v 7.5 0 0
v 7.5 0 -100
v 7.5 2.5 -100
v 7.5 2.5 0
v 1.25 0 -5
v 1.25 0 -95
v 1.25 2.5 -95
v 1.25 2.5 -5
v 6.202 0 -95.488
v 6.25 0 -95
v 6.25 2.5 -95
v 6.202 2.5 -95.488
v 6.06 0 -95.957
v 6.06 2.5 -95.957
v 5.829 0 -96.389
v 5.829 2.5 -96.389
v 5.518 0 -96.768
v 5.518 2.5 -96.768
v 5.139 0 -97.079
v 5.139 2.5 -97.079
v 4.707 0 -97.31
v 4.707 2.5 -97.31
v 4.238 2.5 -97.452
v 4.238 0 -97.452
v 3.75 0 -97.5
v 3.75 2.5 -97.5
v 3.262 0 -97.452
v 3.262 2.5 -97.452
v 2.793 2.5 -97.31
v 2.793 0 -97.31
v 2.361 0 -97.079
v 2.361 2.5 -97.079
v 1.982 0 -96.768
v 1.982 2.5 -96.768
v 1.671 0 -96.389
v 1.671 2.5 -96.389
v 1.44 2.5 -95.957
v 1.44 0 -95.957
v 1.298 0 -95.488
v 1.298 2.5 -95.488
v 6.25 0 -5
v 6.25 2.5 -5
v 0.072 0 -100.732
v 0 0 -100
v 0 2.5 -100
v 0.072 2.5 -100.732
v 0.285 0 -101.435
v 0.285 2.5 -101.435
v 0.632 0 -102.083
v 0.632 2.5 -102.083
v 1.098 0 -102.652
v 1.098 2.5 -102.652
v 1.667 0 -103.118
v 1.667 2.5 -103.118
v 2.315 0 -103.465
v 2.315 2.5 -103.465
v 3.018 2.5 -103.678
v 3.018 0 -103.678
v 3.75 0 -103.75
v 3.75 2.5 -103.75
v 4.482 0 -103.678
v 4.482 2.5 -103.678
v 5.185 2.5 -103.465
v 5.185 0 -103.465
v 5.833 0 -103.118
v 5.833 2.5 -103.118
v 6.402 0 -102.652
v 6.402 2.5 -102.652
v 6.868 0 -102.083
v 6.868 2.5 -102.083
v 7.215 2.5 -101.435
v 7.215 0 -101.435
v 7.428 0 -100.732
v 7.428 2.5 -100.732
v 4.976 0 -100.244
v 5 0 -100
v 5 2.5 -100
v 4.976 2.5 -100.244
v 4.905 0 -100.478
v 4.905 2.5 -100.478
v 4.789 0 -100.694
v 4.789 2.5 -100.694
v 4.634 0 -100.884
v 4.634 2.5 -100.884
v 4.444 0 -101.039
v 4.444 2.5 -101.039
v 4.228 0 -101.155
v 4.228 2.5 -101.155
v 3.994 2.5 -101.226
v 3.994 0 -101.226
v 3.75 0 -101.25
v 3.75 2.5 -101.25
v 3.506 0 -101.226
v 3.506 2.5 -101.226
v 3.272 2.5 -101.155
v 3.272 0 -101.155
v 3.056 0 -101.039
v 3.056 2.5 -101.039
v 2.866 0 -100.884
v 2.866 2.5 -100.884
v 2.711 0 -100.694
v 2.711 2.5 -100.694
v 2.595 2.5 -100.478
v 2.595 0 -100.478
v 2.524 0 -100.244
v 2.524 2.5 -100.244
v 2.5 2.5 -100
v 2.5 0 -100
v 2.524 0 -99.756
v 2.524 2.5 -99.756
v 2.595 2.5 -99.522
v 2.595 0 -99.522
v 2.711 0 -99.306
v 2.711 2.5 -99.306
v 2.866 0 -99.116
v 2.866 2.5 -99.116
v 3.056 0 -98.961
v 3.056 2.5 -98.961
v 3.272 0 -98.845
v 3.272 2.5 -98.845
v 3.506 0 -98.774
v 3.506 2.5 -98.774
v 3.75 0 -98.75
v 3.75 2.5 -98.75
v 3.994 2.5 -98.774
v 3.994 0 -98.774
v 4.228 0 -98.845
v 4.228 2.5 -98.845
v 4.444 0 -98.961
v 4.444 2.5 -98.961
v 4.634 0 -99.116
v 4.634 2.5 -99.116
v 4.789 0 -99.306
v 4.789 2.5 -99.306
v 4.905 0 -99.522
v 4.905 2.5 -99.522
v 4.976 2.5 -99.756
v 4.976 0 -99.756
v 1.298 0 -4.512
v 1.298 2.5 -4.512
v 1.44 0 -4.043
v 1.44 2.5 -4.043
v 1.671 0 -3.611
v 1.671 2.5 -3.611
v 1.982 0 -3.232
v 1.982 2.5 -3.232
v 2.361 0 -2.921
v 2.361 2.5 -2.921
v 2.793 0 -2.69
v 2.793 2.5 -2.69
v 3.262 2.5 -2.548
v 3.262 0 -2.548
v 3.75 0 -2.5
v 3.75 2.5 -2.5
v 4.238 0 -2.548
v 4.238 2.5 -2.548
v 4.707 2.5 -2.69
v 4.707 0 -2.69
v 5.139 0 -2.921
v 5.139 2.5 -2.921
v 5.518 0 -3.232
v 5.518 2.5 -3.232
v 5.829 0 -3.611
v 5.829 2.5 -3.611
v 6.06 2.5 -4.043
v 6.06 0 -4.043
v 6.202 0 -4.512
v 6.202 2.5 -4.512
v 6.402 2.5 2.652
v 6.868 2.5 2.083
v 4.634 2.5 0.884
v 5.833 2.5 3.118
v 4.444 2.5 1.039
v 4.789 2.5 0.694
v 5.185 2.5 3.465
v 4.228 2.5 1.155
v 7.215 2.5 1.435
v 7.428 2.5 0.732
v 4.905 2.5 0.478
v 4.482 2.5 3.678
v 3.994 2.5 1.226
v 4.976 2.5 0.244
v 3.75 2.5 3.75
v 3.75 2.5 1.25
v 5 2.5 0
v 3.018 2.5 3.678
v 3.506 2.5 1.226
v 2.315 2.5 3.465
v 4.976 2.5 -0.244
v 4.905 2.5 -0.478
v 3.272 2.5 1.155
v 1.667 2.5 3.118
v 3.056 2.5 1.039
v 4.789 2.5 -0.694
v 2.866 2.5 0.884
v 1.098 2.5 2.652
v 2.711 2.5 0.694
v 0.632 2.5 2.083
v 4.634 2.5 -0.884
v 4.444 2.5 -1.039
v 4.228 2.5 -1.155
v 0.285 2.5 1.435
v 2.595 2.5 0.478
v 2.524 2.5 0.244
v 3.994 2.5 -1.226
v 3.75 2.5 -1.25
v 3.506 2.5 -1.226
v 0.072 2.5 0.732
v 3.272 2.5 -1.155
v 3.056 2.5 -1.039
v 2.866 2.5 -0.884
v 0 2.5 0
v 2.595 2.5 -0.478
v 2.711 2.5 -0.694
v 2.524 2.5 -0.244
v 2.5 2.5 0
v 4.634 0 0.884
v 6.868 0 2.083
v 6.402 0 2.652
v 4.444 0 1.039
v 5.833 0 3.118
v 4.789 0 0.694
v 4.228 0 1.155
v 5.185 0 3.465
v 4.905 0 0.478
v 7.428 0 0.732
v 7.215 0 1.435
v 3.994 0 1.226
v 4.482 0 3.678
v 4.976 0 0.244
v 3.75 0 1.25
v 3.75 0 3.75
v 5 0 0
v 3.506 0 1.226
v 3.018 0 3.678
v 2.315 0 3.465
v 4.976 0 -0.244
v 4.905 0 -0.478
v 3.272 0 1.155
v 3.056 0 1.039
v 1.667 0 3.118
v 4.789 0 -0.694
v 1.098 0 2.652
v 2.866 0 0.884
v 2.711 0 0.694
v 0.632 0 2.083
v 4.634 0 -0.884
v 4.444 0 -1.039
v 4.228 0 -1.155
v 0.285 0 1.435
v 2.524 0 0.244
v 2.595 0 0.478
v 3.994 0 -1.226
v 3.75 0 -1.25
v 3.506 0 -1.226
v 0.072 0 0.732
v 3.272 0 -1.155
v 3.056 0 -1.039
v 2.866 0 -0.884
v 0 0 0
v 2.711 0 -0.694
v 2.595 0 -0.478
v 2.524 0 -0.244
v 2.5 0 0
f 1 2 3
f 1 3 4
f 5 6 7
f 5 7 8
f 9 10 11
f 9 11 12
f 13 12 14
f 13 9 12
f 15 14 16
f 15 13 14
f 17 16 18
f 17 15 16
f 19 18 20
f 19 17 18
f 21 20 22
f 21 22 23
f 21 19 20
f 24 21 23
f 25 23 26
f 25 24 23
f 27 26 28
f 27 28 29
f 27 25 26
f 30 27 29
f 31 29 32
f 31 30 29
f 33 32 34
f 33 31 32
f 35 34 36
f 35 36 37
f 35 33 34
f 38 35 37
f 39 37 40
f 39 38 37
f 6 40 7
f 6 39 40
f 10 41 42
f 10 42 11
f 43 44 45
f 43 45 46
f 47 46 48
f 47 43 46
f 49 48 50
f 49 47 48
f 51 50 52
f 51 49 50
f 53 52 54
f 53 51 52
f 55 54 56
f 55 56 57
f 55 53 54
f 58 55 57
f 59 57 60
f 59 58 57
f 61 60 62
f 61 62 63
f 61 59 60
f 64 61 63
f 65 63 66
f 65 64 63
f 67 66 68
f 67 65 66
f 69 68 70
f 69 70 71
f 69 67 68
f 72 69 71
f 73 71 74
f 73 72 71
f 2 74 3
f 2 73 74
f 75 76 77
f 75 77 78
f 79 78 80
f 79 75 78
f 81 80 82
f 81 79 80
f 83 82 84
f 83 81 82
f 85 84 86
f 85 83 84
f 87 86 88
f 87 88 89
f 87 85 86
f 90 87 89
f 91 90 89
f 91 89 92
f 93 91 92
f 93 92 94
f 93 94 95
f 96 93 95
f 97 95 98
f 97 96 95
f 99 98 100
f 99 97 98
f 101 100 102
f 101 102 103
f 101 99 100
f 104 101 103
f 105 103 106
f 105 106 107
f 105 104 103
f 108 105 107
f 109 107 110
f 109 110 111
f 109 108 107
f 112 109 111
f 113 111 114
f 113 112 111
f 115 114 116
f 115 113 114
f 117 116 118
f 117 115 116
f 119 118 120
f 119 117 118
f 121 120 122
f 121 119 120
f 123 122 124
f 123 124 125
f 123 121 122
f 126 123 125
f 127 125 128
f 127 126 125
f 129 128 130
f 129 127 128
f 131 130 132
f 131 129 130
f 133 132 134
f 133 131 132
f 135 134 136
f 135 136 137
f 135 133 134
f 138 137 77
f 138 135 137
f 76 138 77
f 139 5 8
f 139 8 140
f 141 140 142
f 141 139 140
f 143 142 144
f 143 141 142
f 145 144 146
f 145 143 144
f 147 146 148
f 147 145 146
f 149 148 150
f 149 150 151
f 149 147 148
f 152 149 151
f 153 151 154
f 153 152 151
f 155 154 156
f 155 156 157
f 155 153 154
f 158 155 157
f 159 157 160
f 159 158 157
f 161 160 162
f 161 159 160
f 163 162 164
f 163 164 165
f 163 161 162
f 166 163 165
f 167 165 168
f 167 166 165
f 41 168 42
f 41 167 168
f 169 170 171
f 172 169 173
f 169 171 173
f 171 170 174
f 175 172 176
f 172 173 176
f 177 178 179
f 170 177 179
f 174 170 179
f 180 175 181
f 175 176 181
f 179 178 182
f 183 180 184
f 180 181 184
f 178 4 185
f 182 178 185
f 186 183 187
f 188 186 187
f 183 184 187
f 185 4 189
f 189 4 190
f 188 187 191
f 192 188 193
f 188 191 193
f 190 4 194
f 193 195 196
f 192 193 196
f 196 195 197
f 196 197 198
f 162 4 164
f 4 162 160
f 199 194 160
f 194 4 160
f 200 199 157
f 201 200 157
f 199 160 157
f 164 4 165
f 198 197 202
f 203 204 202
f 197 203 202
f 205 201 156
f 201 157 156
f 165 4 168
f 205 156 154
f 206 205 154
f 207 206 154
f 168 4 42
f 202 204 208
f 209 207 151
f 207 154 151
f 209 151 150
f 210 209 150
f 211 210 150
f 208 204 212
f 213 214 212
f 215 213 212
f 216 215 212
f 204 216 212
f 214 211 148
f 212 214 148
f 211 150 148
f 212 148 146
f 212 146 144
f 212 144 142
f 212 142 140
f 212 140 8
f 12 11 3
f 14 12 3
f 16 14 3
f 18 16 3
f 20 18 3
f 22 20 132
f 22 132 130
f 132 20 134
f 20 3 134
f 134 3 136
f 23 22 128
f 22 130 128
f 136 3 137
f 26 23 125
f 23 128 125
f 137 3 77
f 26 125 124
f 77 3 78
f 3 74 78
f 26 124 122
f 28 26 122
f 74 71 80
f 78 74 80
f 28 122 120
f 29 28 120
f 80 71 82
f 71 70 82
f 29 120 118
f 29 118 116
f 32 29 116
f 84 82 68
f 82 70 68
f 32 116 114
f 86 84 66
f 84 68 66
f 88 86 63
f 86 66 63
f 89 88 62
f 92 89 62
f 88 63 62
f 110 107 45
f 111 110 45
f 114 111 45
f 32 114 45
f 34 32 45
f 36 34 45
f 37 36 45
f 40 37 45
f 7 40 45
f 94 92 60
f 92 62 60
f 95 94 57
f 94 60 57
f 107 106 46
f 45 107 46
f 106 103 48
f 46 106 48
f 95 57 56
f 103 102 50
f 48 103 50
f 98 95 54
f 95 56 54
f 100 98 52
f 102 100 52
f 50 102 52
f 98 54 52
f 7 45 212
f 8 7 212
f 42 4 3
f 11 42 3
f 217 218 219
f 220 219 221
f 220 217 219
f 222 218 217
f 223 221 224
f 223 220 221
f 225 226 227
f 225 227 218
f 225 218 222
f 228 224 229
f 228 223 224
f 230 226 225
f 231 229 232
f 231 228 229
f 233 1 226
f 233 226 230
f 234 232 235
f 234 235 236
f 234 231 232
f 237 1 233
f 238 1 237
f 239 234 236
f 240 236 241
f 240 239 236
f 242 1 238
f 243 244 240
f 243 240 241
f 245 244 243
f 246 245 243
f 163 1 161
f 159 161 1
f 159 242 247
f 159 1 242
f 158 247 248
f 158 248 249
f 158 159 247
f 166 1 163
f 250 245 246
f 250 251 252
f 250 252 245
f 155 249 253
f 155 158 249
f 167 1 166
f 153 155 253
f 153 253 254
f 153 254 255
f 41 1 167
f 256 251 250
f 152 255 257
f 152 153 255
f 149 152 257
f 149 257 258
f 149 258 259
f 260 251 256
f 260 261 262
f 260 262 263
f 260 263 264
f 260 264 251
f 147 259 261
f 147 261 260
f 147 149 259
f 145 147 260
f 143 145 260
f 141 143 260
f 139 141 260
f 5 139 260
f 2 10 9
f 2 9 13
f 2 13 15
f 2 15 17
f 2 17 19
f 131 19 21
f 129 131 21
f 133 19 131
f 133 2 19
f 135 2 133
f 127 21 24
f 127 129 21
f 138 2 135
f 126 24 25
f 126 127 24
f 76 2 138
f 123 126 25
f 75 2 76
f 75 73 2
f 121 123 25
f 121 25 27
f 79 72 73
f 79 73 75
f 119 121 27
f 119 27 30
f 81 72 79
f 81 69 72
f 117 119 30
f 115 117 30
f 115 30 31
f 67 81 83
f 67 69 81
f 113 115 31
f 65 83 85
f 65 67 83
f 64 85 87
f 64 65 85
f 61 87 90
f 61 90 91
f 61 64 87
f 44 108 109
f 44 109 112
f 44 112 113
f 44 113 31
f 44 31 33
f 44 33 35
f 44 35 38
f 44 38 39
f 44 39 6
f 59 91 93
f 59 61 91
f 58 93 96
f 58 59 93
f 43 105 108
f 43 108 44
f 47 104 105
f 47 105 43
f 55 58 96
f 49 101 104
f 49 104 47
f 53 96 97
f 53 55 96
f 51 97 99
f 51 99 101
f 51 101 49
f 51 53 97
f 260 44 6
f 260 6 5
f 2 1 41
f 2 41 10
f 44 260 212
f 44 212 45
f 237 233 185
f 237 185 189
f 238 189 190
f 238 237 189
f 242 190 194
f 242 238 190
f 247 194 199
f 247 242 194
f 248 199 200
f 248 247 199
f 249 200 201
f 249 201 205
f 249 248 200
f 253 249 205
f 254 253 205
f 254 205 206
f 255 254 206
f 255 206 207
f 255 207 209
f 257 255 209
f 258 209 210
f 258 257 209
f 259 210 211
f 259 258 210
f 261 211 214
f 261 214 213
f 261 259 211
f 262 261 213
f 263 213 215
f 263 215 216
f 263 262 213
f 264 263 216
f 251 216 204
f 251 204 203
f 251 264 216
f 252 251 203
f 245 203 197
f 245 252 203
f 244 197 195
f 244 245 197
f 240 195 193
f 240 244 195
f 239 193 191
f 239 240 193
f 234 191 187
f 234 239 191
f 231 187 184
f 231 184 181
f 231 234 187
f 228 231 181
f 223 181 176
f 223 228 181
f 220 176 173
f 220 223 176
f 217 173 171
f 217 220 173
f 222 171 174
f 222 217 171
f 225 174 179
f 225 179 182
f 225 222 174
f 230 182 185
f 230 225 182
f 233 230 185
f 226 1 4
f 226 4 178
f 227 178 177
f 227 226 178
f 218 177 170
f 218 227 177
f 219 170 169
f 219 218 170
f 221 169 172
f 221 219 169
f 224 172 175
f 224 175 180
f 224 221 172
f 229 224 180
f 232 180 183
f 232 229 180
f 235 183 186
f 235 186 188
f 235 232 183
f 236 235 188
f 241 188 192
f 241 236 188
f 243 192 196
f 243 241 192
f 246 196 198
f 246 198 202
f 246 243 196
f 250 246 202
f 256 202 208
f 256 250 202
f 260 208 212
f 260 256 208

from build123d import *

# Parameters (mm, degrees)
SKETCH1_R           = 1.25
BOSS_EXTRUDE1_DEPTH = 2.5


with BuildPart() as part:
    # Sketch1 → Boss-Extrude1 (new body)
    with BuildSketch(Plane(origin=(0, 0, 0), x_dir=(1, 0, 0), z_dir=(0, 1, 0))):
        with BuildLine():
            Line((0, 0), (0, 100))
            ThreePointArc((0, 100), (3.75, 103.75), (7.5, 100))
            Line((7.5, 100), (7.5, 0))
            ThreePointArc((7.5, 0), (3.75, -3.75), (0, 0))
        make_face()
        with Locations((3.75, 0)):
            Circle(SKETCH1_R, mode=Mode.SUBTRACT)
        with Locations((3.75, 100)):
            Circle(SKETCH1_R, mode=Mode.SUBTRACT)
        with BuildLine():
            Line((1.25, 95), (1.25, 5))
            ThreePointArc((1.25, 5), (3.75, 2.5), (6.25, 5))
            Line((6.25, 5), (6.25, 95))
            ThreePointArc((6.25, 95), (3.75, 97.5), (1.25, 95))
        make_face(mode=Mode.SUBTRACT)
    extrude(amount=BOSS_EXTRUDE1_DEPTH)


solid = part.part
